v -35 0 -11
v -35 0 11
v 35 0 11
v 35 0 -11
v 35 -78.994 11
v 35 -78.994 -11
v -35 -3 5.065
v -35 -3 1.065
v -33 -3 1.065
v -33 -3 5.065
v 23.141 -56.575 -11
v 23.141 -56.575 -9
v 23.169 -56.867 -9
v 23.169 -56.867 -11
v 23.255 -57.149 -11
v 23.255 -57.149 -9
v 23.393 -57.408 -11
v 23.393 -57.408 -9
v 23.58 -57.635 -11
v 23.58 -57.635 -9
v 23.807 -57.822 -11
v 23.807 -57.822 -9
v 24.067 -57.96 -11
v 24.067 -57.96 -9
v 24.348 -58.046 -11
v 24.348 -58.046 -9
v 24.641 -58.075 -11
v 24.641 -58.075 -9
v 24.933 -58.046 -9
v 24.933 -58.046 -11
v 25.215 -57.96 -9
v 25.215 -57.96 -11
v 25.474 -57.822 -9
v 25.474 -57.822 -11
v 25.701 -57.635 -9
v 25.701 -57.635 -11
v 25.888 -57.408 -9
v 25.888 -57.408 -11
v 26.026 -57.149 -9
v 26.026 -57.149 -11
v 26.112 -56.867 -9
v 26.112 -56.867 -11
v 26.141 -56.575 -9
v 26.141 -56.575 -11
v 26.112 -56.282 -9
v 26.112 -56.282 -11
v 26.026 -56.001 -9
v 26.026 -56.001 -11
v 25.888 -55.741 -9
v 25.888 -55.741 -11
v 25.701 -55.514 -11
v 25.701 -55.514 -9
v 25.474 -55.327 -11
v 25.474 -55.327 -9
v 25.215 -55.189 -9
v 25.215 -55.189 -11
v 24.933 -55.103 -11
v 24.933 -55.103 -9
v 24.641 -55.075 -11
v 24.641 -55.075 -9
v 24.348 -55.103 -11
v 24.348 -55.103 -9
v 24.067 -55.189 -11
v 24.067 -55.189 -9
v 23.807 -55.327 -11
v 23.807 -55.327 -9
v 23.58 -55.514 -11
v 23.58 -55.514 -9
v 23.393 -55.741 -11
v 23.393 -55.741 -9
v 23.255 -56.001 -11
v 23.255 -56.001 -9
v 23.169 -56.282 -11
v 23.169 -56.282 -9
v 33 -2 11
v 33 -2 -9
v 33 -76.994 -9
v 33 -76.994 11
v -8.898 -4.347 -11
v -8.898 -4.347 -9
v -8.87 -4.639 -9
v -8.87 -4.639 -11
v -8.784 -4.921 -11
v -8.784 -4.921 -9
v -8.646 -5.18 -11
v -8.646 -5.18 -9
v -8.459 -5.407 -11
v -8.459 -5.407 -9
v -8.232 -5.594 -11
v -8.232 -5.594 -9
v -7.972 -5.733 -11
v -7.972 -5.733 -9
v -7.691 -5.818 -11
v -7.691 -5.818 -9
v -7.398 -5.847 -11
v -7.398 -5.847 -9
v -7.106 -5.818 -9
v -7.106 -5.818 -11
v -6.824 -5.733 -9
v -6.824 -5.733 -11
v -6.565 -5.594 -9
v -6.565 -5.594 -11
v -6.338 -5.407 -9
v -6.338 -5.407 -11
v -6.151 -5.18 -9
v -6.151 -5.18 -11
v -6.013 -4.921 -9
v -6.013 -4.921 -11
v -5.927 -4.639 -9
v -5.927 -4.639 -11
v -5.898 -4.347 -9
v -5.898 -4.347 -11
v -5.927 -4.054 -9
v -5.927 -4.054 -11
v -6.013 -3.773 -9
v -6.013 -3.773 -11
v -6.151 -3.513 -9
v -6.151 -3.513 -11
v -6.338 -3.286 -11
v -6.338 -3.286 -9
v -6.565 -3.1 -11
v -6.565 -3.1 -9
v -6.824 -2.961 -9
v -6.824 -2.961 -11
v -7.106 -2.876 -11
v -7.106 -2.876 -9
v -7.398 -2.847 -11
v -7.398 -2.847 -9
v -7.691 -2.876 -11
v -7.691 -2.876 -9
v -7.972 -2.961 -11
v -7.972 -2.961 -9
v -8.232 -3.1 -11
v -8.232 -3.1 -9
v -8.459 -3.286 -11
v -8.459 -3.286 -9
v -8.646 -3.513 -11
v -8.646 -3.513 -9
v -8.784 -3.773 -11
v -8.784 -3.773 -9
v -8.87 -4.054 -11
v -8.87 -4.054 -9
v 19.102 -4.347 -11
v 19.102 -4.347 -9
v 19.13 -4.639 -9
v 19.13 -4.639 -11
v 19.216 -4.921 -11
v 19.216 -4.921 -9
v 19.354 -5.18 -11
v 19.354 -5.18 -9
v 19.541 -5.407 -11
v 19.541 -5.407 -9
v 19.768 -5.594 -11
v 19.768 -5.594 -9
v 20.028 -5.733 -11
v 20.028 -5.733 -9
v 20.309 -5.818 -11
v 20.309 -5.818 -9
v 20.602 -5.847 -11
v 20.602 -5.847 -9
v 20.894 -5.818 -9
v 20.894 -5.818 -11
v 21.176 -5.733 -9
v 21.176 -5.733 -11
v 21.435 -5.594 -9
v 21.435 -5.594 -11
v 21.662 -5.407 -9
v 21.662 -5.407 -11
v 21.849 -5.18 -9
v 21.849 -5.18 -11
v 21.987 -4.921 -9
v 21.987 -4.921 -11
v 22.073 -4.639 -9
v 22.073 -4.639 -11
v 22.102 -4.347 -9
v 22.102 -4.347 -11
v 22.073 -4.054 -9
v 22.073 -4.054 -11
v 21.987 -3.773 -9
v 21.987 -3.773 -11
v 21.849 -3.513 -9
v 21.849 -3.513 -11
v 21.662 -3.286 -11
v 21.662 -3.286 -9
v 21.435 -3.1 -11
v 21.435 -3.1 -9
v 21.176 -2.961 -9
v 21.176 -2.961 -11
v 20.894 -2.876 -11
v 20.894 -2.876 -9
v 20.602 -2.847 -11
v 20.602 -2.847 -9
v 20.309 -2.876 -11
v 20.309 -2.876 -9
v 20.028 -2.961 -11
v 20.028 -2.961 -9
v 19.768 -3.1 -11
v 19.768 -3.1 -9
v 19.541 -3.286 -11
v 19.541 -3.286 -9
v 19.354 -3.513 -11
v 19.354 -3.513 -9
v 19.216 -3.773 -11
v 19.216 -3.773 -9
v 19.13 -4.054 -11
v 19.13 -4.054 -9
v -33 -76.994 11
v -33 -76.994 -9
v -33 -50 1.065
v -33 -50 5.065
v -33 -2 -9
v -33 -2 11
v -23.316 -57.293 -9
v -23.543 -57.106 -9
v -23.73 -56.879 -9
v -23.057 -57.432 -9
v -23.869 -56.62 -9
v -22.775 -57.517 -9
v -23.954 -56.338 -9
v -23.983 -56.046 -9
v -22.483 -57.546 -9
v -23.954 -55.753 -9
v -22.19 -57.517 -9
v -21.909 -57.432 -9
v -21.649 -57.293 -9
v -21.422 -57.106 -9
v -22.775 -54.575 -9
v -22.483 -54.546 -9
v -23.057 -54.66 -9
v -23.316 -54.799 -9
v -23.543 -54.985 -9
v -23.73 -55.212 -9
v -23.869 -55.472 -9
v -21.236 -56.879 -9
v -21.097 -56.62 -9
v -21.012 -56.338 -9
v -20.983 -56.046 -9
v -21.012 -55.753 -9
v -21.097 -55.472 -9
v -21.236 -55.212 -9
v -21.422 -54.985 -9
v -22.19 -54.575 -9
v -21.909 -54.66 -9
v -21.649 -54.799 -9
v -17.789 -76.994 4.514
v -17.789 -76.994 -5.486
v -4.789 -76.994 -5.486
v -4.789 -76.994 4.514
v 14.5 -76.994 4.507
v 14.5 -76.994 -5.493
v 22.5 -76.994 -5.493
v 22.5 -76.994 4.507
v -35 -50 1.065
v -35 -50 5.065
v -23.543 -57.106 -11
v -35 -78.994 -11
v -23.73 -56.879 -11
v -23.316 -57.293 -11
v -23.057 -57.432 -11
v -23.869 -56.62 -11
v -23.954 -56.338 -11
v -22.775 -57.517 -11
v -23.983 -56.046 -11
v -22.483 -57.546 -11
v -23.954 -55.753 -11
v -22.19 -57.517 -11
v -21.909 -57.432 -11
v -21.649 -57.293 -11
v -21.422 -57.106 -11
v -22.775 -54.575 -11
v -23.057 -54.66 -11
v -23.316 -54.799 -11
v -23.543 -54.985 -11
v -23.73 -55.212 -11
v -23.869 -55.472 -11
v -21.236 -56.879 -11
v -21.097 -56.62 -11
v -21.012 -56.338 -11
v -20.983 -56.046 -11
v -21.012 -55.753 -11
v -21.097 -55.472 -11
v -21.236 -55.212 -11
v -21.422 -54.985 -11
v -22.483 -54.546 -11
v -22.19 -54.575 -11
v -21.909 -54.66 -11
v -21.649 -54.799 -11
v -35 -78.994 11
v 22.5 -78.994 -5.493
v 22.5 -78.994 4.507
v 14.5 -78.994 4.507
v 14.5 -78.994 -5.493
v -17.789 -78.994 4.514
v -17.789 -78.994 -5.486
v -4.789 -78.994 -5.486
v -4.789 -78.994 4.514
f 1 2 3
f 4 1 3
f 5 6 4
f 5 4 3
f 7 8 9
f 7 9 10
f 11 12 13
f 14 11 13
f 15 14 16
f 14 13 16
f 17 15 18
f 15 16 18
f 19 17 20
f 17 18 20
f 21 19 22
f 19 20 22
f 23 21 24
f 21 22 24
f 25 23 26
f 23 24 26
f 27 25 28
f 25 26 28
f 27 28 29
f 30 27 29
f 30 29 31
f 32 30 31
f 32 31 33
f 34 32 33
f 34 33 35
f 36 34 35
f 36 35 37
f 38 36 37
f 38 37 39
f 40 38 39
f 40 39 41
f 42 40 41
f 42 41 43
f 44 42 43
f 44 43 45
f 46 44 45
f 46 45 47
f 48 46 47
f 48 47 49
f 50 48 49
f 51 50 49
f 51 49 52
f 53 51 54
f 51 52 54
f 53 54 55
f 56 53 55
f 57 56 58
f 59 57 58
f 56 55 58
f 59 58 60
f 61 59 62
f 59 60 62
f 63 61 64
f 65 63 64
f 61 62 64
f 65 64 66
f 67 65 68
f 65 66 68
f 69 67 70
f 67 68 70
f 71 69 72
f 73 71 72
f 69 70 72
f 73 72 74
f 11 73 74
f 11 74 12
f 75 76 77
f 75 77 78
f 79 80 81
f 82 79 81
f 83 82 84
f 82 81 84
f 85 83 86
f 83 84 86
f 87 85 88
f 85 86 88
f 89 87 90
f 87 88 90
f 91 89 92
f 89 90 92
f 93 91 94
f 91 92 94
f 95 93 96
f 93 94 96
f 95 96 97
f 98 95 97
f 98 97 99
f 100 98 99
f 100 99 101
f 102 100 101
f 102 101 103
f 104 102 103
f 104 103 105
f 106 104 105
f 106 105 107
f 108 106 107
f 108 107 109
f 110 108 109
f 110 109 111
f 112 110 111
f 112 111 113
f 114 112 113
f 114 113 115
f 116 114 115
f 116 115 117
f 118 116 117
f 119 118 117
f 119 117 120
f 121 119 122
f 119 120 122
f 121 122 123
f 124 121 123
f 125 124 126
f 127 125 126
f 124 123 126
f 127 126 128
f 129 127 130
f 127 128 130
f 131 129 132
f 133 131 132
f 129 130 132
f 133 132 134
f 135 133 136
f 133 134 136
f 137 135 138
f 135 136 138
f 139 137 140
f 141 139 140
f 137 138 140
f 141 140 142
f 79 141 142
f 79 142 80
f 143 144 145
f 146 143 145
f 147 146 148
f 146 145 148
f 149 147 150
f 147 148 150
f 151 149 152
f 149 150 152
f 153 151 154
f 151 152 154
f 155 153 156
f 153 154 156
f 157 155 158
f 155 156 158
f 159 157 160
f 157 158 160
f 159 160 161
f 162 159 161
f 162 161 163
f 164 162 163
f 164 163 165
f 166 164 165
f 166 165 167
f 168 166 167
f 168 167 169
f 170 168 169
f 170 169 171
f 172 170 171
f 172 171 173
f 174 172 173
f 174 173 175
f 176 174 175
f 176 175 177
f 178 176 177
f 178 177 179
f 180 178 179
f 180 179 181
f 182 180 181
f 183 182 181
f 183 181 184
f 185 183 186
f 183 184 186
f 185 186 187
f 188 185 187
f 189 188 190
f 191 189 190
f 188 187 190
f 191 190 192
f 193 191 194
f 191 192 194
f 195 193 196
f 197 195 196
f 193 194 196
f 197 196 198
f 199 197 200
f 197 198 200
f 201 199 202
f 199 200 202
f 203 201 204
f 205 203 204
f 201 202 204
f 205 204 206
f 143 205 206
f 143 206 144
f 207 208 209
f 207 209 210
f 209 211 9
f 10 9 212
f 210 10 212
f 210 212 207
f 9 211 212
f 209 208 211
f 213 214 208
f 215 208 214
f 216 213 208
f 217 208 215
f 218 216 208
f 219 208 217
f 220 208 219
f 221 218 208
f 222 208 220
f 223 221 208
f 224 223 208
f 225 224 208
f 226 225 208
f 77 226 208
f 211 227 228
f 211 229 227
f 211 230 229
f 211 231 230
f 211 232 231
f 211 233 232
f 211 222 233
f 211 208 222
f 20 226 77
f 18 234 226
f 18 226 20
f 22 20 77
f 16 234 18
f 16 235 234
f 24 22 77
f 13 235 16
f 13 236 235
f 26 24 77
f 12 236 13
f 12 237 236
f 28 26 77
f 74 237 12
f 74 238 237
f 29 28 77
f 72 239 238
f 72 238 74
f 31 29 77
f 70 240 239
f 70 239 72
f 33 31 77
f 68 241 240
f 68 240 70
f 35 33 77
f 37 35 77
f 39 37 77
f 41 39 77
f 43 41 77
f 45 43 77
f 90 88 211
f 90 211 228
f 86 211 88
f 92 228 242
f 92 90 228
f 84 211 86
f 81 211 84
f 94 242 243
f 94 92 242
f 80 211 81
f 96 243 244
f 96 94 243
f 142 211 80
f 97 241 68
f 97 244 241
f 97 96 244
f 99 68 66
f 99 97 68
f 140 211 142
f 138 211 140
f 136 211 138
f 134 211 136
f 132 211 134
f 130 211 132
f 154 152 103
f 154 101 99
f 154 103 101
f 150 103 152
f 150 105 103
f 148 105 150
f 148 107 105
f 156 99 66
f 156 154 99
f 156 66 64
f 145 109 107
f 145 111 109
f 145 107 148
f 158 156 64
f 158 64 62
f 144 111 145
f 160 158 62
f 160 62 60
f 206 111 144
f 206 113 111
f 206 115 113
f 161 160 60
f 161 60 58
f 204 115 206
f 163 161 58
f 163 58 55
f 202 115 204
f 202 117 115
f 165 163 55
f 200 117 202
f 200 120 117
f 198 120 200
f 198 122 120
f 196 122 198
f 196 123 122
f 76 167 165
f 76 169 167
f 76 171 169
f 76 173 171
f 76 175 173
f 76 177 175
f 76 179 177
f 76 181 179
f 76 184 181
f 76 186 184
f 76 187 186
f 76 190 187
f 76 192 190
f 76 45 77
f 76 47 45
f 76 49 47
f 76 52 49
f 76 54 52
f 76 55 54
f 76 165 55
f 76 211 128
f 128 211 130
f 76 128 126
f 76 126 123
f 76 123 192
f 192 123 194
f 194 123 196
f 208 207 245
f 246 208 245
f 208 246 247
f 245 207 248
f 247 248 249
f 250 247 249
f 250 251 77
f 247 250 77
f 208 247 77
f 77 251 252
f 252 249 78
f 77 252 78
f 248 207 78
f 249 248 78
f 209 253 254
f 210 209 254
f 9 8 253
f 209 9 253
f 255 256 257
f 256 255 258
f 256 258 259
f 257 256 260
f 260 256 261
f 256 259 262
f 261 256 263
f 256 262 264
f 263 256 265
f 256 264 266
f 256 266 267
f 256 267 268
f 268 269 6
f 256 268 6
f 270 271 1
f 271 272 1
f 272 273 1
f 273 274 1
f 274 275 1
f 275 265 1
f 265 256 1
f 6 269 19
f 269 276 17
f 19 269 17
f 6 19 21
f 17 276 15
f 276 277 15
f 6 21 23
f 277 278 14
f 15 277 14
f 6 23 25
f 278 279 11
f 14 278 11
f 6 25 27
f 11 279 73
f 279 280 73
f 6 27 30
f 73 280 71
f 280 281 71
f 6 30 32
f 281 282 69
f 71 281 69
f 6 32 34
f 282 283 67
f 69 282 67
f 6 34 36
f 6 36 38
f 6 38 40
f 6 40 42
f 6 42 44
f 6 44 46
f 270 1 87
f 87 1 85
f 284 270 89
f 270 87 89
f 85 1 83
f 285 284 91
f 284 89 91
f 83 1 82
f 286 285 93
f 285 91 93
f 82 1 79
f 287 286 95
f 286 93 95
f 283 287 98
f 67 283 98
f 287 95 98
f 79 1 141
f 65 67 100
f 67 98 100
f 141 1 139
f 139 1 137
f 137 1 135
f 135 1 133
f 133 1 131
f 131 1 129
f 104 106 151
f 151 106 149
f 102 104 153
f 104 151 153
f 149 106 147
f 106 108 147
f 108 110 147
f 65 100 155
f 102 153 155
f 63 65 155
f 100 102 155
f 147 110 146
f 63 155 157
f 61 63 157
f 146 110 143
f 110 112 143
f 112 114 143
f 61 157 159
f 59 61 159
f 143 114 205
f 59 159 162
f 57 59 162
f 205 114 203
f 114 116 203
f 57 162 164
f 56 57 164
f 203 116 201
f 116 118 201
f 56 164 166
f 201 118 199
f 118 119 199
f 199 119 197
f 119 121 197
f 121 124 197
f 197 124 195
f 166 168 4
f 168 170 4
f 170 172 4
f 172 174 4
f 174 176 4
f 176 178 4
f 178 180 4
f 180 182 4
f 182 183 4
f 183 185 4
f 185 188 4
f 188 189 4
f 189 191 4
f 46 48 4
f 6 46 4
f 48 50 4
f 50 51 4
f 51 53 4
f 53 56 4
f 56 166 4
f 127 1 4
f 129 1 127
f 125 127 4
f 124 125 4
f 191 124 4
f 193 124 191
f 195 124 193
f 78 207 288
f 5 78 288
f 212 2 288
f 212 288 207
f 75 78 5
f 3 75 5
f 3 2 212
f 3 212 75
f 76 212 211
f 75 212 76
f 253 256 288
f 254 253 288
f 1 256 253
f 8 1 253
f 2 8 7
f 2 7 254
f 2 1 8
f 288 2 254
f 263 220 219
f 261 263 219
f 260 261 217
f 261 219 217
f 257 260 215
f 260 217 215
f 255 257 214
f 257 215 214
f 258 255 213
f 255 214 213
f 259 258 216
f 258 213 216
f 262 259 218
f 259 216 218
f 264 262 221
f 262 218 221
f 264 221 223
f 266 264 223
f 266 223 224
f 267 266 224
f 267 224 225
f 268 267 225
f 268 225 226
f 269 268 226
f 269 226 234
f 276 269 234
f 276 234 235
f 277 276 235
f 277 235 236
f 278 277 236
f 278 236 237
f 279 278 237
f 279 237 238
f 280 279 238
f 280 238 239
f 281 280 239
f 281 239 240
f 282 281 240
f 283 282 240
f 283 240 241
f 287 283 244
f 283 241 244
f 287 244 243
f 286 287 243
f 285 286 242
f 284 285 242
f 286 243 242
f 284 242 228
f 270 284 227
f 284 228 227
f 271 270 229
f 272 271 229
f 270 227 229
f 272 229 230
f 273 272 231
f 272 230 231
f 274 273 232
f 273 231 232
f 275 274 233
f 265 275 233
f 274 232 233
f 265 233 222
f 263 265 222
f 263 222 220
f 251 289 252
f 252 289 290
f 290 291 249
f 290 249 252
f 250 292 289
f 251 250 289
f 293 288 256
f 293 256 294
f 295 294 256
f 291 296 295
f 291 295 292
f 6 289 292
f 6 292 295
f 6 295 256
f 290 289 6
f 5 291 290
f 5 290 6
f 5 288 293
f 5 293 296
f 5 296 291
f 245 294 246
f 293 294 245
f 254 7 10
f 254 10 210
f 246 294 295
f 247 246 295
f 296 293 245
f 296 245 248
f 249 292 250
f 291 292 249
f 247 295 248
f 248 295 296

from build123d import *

# Parameters (mm, degrees)
F0_W     = 70
F0_H     = 22
F1_DEPTH = 78.994
F2_T     = -2
F3_W     = 13
F3_H     = 10
F3_W_2   = 8
F4_DEPTH = 25.4
F5_W     = 47
F5_H     = 4
F6_DEPTH = 25.4
F8_D     = 3


with BuildPart() as f1:
    # F0 (on Front) → F1 (new body)
    with BuildSketch(Plane.XZ):
        Rectangle(F0_W, F0_H)
    extrude(amount=F1_DEPTH)

    # F2
    f2_openings = [f1.faces().sort_by_distance(p)[0] for p in [
        (0, -39.497, 11),
    ]]
    offset(amount=F2_T, openings=f2_openings)

    # F3 (on face) → F4 (cut)
    with BuildSketch(Plane.XZ.offset(78.994)):
        with Locations((-11.289247, -0.486001)):
            Rectangle(F3_W, F3_H)
        with Locations((18.5, -0.492737)):
            Rectangle(F3_W_2, F3_H)
    extrude(amount=-F4_DEPTH, mode=Mode.SUBTRACT)

    # F5 (on face) → F6 (cut)
    with BuildSketch(Plane(origin=(-35, 0, 0), x_dir=(0, -1, 0), z_dir=(-1, 0, 0))):
        with Locations((26.5, 3.065218)):
            Rectangle(F5_W, F5_H)
    extrude(amount=-F6_DEPTH, mode=Mode.SUBTRACT)

    # F8 (through all)
    with Locations(Plane(origin=(0, 0, -11), x_dir=(1, 0, 0), z_dir=(0, 0, -1))):
        with Locations((-7.398465, 4.346834), (20.601535, 4.346834), (24.640625, 56.574557), (-22.482722, 56.045765)):
            Hole(F8_D / 2)


solid = f1.part
